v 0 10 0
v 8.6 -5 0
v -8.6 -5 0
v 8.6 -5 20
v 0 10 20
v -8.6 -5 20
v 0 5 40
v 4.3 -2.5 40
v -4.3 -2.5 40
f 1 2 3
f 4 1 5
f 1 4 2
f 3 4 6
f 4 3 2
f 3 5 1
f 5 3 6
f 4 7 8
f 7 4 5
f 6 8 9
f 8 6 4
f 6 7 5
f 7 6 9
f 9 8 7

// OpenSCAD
/**
 * High-Level: Provides utilities for generating complex 3D meshes from 
 * structured point data.
 */

// --- Example Usage ---
// Creates a triangular tube with 3 rings.
// The first two rings are identical, and the third is smaller.

triangle_pts = [
    [0, 10, 0], [8.6, -5, 0], [-8.6, -5, 0], // Ring 1 (z=0)
    [0, 10, 20], [8.6, -5, 20], [-8.6, -5, 20], // Ring 2 (z=20)
    [0, 5, 40], [4.3, -2.5, 40], [-4.3, -2.5, 40] // Ring 3 (z=40, scaled 0.5)
];
Loft(triangle_pts, 3);


/**
 * Calculates the faces for a lofted polyhedron.
 *
 * @param points_count Total number of points in the flat list.
 * @param points_per_ring The number of vertices in each ring.
 * @param caps If true, generates faces for the first and last rings.
 * @param closed_loop If true, connects the last vertex of each ring back to the first.
 * @return A list of faces (each face is a list of vertex indices).
 */
function get_loft_faces(points_count, points_per_ring, caps = true, closed_loop = true) = let(
    num_rings = points_count / points_per_ring,
    
    // 1. Cap Faces
    top_face    = caps ? [[for (i = [points_per_ring - 1 : -1 : 0]) i]] : [],
    bottom_face = caps ? [[for (i = [0 : points_per_ring - 1]) points_count - points_per_ring + i]] : [],

    // 2. Side Faces (Quads between rings)
    side_faces = [
        for (r = [0 : num_rings - 2]) 
        for (i = [0 : points_per_ring - 1]) 
        if (closed_loop || i < points_per_ring - 1)
        let(
            i_next = (i + 1) % points_per_ring,
            r_now  = r * points_per_ring,
            r_next = (r + 1) * points_per_ring
        )
        [
            r_now + i, 
            r_now + i_next, 
            r_next + i_next, 
            r_next + i
        ]
    ]
) concat(top_face, side_faces, bottom_face);

/**
 * Creates a polyhedron by "skinning" or "lofting" through multiple rings of points.
 *
 * @param points A flat list of points [v1, v2, ..., vk] where k = num_rings * points_per_ring.
 * @param points_per_ring The number of vertices in each ring.
 * @param convexity The convexity parameter for the polyhedron.
 */
module Loft(points, points_per_ring, convexity = 10) {
    assert(len(points) % points_per_ring == 0, "Total points must be a multiple of points per ring");
    
    faces = get_loft_faces(
        points_count    = len(points), 
        points_per_ring = points_per_ring, 
        caps            = true, 
        closed_loop     = true
    );

    polyhedron(points = points, faces = faces, convexity = convexity);
}
